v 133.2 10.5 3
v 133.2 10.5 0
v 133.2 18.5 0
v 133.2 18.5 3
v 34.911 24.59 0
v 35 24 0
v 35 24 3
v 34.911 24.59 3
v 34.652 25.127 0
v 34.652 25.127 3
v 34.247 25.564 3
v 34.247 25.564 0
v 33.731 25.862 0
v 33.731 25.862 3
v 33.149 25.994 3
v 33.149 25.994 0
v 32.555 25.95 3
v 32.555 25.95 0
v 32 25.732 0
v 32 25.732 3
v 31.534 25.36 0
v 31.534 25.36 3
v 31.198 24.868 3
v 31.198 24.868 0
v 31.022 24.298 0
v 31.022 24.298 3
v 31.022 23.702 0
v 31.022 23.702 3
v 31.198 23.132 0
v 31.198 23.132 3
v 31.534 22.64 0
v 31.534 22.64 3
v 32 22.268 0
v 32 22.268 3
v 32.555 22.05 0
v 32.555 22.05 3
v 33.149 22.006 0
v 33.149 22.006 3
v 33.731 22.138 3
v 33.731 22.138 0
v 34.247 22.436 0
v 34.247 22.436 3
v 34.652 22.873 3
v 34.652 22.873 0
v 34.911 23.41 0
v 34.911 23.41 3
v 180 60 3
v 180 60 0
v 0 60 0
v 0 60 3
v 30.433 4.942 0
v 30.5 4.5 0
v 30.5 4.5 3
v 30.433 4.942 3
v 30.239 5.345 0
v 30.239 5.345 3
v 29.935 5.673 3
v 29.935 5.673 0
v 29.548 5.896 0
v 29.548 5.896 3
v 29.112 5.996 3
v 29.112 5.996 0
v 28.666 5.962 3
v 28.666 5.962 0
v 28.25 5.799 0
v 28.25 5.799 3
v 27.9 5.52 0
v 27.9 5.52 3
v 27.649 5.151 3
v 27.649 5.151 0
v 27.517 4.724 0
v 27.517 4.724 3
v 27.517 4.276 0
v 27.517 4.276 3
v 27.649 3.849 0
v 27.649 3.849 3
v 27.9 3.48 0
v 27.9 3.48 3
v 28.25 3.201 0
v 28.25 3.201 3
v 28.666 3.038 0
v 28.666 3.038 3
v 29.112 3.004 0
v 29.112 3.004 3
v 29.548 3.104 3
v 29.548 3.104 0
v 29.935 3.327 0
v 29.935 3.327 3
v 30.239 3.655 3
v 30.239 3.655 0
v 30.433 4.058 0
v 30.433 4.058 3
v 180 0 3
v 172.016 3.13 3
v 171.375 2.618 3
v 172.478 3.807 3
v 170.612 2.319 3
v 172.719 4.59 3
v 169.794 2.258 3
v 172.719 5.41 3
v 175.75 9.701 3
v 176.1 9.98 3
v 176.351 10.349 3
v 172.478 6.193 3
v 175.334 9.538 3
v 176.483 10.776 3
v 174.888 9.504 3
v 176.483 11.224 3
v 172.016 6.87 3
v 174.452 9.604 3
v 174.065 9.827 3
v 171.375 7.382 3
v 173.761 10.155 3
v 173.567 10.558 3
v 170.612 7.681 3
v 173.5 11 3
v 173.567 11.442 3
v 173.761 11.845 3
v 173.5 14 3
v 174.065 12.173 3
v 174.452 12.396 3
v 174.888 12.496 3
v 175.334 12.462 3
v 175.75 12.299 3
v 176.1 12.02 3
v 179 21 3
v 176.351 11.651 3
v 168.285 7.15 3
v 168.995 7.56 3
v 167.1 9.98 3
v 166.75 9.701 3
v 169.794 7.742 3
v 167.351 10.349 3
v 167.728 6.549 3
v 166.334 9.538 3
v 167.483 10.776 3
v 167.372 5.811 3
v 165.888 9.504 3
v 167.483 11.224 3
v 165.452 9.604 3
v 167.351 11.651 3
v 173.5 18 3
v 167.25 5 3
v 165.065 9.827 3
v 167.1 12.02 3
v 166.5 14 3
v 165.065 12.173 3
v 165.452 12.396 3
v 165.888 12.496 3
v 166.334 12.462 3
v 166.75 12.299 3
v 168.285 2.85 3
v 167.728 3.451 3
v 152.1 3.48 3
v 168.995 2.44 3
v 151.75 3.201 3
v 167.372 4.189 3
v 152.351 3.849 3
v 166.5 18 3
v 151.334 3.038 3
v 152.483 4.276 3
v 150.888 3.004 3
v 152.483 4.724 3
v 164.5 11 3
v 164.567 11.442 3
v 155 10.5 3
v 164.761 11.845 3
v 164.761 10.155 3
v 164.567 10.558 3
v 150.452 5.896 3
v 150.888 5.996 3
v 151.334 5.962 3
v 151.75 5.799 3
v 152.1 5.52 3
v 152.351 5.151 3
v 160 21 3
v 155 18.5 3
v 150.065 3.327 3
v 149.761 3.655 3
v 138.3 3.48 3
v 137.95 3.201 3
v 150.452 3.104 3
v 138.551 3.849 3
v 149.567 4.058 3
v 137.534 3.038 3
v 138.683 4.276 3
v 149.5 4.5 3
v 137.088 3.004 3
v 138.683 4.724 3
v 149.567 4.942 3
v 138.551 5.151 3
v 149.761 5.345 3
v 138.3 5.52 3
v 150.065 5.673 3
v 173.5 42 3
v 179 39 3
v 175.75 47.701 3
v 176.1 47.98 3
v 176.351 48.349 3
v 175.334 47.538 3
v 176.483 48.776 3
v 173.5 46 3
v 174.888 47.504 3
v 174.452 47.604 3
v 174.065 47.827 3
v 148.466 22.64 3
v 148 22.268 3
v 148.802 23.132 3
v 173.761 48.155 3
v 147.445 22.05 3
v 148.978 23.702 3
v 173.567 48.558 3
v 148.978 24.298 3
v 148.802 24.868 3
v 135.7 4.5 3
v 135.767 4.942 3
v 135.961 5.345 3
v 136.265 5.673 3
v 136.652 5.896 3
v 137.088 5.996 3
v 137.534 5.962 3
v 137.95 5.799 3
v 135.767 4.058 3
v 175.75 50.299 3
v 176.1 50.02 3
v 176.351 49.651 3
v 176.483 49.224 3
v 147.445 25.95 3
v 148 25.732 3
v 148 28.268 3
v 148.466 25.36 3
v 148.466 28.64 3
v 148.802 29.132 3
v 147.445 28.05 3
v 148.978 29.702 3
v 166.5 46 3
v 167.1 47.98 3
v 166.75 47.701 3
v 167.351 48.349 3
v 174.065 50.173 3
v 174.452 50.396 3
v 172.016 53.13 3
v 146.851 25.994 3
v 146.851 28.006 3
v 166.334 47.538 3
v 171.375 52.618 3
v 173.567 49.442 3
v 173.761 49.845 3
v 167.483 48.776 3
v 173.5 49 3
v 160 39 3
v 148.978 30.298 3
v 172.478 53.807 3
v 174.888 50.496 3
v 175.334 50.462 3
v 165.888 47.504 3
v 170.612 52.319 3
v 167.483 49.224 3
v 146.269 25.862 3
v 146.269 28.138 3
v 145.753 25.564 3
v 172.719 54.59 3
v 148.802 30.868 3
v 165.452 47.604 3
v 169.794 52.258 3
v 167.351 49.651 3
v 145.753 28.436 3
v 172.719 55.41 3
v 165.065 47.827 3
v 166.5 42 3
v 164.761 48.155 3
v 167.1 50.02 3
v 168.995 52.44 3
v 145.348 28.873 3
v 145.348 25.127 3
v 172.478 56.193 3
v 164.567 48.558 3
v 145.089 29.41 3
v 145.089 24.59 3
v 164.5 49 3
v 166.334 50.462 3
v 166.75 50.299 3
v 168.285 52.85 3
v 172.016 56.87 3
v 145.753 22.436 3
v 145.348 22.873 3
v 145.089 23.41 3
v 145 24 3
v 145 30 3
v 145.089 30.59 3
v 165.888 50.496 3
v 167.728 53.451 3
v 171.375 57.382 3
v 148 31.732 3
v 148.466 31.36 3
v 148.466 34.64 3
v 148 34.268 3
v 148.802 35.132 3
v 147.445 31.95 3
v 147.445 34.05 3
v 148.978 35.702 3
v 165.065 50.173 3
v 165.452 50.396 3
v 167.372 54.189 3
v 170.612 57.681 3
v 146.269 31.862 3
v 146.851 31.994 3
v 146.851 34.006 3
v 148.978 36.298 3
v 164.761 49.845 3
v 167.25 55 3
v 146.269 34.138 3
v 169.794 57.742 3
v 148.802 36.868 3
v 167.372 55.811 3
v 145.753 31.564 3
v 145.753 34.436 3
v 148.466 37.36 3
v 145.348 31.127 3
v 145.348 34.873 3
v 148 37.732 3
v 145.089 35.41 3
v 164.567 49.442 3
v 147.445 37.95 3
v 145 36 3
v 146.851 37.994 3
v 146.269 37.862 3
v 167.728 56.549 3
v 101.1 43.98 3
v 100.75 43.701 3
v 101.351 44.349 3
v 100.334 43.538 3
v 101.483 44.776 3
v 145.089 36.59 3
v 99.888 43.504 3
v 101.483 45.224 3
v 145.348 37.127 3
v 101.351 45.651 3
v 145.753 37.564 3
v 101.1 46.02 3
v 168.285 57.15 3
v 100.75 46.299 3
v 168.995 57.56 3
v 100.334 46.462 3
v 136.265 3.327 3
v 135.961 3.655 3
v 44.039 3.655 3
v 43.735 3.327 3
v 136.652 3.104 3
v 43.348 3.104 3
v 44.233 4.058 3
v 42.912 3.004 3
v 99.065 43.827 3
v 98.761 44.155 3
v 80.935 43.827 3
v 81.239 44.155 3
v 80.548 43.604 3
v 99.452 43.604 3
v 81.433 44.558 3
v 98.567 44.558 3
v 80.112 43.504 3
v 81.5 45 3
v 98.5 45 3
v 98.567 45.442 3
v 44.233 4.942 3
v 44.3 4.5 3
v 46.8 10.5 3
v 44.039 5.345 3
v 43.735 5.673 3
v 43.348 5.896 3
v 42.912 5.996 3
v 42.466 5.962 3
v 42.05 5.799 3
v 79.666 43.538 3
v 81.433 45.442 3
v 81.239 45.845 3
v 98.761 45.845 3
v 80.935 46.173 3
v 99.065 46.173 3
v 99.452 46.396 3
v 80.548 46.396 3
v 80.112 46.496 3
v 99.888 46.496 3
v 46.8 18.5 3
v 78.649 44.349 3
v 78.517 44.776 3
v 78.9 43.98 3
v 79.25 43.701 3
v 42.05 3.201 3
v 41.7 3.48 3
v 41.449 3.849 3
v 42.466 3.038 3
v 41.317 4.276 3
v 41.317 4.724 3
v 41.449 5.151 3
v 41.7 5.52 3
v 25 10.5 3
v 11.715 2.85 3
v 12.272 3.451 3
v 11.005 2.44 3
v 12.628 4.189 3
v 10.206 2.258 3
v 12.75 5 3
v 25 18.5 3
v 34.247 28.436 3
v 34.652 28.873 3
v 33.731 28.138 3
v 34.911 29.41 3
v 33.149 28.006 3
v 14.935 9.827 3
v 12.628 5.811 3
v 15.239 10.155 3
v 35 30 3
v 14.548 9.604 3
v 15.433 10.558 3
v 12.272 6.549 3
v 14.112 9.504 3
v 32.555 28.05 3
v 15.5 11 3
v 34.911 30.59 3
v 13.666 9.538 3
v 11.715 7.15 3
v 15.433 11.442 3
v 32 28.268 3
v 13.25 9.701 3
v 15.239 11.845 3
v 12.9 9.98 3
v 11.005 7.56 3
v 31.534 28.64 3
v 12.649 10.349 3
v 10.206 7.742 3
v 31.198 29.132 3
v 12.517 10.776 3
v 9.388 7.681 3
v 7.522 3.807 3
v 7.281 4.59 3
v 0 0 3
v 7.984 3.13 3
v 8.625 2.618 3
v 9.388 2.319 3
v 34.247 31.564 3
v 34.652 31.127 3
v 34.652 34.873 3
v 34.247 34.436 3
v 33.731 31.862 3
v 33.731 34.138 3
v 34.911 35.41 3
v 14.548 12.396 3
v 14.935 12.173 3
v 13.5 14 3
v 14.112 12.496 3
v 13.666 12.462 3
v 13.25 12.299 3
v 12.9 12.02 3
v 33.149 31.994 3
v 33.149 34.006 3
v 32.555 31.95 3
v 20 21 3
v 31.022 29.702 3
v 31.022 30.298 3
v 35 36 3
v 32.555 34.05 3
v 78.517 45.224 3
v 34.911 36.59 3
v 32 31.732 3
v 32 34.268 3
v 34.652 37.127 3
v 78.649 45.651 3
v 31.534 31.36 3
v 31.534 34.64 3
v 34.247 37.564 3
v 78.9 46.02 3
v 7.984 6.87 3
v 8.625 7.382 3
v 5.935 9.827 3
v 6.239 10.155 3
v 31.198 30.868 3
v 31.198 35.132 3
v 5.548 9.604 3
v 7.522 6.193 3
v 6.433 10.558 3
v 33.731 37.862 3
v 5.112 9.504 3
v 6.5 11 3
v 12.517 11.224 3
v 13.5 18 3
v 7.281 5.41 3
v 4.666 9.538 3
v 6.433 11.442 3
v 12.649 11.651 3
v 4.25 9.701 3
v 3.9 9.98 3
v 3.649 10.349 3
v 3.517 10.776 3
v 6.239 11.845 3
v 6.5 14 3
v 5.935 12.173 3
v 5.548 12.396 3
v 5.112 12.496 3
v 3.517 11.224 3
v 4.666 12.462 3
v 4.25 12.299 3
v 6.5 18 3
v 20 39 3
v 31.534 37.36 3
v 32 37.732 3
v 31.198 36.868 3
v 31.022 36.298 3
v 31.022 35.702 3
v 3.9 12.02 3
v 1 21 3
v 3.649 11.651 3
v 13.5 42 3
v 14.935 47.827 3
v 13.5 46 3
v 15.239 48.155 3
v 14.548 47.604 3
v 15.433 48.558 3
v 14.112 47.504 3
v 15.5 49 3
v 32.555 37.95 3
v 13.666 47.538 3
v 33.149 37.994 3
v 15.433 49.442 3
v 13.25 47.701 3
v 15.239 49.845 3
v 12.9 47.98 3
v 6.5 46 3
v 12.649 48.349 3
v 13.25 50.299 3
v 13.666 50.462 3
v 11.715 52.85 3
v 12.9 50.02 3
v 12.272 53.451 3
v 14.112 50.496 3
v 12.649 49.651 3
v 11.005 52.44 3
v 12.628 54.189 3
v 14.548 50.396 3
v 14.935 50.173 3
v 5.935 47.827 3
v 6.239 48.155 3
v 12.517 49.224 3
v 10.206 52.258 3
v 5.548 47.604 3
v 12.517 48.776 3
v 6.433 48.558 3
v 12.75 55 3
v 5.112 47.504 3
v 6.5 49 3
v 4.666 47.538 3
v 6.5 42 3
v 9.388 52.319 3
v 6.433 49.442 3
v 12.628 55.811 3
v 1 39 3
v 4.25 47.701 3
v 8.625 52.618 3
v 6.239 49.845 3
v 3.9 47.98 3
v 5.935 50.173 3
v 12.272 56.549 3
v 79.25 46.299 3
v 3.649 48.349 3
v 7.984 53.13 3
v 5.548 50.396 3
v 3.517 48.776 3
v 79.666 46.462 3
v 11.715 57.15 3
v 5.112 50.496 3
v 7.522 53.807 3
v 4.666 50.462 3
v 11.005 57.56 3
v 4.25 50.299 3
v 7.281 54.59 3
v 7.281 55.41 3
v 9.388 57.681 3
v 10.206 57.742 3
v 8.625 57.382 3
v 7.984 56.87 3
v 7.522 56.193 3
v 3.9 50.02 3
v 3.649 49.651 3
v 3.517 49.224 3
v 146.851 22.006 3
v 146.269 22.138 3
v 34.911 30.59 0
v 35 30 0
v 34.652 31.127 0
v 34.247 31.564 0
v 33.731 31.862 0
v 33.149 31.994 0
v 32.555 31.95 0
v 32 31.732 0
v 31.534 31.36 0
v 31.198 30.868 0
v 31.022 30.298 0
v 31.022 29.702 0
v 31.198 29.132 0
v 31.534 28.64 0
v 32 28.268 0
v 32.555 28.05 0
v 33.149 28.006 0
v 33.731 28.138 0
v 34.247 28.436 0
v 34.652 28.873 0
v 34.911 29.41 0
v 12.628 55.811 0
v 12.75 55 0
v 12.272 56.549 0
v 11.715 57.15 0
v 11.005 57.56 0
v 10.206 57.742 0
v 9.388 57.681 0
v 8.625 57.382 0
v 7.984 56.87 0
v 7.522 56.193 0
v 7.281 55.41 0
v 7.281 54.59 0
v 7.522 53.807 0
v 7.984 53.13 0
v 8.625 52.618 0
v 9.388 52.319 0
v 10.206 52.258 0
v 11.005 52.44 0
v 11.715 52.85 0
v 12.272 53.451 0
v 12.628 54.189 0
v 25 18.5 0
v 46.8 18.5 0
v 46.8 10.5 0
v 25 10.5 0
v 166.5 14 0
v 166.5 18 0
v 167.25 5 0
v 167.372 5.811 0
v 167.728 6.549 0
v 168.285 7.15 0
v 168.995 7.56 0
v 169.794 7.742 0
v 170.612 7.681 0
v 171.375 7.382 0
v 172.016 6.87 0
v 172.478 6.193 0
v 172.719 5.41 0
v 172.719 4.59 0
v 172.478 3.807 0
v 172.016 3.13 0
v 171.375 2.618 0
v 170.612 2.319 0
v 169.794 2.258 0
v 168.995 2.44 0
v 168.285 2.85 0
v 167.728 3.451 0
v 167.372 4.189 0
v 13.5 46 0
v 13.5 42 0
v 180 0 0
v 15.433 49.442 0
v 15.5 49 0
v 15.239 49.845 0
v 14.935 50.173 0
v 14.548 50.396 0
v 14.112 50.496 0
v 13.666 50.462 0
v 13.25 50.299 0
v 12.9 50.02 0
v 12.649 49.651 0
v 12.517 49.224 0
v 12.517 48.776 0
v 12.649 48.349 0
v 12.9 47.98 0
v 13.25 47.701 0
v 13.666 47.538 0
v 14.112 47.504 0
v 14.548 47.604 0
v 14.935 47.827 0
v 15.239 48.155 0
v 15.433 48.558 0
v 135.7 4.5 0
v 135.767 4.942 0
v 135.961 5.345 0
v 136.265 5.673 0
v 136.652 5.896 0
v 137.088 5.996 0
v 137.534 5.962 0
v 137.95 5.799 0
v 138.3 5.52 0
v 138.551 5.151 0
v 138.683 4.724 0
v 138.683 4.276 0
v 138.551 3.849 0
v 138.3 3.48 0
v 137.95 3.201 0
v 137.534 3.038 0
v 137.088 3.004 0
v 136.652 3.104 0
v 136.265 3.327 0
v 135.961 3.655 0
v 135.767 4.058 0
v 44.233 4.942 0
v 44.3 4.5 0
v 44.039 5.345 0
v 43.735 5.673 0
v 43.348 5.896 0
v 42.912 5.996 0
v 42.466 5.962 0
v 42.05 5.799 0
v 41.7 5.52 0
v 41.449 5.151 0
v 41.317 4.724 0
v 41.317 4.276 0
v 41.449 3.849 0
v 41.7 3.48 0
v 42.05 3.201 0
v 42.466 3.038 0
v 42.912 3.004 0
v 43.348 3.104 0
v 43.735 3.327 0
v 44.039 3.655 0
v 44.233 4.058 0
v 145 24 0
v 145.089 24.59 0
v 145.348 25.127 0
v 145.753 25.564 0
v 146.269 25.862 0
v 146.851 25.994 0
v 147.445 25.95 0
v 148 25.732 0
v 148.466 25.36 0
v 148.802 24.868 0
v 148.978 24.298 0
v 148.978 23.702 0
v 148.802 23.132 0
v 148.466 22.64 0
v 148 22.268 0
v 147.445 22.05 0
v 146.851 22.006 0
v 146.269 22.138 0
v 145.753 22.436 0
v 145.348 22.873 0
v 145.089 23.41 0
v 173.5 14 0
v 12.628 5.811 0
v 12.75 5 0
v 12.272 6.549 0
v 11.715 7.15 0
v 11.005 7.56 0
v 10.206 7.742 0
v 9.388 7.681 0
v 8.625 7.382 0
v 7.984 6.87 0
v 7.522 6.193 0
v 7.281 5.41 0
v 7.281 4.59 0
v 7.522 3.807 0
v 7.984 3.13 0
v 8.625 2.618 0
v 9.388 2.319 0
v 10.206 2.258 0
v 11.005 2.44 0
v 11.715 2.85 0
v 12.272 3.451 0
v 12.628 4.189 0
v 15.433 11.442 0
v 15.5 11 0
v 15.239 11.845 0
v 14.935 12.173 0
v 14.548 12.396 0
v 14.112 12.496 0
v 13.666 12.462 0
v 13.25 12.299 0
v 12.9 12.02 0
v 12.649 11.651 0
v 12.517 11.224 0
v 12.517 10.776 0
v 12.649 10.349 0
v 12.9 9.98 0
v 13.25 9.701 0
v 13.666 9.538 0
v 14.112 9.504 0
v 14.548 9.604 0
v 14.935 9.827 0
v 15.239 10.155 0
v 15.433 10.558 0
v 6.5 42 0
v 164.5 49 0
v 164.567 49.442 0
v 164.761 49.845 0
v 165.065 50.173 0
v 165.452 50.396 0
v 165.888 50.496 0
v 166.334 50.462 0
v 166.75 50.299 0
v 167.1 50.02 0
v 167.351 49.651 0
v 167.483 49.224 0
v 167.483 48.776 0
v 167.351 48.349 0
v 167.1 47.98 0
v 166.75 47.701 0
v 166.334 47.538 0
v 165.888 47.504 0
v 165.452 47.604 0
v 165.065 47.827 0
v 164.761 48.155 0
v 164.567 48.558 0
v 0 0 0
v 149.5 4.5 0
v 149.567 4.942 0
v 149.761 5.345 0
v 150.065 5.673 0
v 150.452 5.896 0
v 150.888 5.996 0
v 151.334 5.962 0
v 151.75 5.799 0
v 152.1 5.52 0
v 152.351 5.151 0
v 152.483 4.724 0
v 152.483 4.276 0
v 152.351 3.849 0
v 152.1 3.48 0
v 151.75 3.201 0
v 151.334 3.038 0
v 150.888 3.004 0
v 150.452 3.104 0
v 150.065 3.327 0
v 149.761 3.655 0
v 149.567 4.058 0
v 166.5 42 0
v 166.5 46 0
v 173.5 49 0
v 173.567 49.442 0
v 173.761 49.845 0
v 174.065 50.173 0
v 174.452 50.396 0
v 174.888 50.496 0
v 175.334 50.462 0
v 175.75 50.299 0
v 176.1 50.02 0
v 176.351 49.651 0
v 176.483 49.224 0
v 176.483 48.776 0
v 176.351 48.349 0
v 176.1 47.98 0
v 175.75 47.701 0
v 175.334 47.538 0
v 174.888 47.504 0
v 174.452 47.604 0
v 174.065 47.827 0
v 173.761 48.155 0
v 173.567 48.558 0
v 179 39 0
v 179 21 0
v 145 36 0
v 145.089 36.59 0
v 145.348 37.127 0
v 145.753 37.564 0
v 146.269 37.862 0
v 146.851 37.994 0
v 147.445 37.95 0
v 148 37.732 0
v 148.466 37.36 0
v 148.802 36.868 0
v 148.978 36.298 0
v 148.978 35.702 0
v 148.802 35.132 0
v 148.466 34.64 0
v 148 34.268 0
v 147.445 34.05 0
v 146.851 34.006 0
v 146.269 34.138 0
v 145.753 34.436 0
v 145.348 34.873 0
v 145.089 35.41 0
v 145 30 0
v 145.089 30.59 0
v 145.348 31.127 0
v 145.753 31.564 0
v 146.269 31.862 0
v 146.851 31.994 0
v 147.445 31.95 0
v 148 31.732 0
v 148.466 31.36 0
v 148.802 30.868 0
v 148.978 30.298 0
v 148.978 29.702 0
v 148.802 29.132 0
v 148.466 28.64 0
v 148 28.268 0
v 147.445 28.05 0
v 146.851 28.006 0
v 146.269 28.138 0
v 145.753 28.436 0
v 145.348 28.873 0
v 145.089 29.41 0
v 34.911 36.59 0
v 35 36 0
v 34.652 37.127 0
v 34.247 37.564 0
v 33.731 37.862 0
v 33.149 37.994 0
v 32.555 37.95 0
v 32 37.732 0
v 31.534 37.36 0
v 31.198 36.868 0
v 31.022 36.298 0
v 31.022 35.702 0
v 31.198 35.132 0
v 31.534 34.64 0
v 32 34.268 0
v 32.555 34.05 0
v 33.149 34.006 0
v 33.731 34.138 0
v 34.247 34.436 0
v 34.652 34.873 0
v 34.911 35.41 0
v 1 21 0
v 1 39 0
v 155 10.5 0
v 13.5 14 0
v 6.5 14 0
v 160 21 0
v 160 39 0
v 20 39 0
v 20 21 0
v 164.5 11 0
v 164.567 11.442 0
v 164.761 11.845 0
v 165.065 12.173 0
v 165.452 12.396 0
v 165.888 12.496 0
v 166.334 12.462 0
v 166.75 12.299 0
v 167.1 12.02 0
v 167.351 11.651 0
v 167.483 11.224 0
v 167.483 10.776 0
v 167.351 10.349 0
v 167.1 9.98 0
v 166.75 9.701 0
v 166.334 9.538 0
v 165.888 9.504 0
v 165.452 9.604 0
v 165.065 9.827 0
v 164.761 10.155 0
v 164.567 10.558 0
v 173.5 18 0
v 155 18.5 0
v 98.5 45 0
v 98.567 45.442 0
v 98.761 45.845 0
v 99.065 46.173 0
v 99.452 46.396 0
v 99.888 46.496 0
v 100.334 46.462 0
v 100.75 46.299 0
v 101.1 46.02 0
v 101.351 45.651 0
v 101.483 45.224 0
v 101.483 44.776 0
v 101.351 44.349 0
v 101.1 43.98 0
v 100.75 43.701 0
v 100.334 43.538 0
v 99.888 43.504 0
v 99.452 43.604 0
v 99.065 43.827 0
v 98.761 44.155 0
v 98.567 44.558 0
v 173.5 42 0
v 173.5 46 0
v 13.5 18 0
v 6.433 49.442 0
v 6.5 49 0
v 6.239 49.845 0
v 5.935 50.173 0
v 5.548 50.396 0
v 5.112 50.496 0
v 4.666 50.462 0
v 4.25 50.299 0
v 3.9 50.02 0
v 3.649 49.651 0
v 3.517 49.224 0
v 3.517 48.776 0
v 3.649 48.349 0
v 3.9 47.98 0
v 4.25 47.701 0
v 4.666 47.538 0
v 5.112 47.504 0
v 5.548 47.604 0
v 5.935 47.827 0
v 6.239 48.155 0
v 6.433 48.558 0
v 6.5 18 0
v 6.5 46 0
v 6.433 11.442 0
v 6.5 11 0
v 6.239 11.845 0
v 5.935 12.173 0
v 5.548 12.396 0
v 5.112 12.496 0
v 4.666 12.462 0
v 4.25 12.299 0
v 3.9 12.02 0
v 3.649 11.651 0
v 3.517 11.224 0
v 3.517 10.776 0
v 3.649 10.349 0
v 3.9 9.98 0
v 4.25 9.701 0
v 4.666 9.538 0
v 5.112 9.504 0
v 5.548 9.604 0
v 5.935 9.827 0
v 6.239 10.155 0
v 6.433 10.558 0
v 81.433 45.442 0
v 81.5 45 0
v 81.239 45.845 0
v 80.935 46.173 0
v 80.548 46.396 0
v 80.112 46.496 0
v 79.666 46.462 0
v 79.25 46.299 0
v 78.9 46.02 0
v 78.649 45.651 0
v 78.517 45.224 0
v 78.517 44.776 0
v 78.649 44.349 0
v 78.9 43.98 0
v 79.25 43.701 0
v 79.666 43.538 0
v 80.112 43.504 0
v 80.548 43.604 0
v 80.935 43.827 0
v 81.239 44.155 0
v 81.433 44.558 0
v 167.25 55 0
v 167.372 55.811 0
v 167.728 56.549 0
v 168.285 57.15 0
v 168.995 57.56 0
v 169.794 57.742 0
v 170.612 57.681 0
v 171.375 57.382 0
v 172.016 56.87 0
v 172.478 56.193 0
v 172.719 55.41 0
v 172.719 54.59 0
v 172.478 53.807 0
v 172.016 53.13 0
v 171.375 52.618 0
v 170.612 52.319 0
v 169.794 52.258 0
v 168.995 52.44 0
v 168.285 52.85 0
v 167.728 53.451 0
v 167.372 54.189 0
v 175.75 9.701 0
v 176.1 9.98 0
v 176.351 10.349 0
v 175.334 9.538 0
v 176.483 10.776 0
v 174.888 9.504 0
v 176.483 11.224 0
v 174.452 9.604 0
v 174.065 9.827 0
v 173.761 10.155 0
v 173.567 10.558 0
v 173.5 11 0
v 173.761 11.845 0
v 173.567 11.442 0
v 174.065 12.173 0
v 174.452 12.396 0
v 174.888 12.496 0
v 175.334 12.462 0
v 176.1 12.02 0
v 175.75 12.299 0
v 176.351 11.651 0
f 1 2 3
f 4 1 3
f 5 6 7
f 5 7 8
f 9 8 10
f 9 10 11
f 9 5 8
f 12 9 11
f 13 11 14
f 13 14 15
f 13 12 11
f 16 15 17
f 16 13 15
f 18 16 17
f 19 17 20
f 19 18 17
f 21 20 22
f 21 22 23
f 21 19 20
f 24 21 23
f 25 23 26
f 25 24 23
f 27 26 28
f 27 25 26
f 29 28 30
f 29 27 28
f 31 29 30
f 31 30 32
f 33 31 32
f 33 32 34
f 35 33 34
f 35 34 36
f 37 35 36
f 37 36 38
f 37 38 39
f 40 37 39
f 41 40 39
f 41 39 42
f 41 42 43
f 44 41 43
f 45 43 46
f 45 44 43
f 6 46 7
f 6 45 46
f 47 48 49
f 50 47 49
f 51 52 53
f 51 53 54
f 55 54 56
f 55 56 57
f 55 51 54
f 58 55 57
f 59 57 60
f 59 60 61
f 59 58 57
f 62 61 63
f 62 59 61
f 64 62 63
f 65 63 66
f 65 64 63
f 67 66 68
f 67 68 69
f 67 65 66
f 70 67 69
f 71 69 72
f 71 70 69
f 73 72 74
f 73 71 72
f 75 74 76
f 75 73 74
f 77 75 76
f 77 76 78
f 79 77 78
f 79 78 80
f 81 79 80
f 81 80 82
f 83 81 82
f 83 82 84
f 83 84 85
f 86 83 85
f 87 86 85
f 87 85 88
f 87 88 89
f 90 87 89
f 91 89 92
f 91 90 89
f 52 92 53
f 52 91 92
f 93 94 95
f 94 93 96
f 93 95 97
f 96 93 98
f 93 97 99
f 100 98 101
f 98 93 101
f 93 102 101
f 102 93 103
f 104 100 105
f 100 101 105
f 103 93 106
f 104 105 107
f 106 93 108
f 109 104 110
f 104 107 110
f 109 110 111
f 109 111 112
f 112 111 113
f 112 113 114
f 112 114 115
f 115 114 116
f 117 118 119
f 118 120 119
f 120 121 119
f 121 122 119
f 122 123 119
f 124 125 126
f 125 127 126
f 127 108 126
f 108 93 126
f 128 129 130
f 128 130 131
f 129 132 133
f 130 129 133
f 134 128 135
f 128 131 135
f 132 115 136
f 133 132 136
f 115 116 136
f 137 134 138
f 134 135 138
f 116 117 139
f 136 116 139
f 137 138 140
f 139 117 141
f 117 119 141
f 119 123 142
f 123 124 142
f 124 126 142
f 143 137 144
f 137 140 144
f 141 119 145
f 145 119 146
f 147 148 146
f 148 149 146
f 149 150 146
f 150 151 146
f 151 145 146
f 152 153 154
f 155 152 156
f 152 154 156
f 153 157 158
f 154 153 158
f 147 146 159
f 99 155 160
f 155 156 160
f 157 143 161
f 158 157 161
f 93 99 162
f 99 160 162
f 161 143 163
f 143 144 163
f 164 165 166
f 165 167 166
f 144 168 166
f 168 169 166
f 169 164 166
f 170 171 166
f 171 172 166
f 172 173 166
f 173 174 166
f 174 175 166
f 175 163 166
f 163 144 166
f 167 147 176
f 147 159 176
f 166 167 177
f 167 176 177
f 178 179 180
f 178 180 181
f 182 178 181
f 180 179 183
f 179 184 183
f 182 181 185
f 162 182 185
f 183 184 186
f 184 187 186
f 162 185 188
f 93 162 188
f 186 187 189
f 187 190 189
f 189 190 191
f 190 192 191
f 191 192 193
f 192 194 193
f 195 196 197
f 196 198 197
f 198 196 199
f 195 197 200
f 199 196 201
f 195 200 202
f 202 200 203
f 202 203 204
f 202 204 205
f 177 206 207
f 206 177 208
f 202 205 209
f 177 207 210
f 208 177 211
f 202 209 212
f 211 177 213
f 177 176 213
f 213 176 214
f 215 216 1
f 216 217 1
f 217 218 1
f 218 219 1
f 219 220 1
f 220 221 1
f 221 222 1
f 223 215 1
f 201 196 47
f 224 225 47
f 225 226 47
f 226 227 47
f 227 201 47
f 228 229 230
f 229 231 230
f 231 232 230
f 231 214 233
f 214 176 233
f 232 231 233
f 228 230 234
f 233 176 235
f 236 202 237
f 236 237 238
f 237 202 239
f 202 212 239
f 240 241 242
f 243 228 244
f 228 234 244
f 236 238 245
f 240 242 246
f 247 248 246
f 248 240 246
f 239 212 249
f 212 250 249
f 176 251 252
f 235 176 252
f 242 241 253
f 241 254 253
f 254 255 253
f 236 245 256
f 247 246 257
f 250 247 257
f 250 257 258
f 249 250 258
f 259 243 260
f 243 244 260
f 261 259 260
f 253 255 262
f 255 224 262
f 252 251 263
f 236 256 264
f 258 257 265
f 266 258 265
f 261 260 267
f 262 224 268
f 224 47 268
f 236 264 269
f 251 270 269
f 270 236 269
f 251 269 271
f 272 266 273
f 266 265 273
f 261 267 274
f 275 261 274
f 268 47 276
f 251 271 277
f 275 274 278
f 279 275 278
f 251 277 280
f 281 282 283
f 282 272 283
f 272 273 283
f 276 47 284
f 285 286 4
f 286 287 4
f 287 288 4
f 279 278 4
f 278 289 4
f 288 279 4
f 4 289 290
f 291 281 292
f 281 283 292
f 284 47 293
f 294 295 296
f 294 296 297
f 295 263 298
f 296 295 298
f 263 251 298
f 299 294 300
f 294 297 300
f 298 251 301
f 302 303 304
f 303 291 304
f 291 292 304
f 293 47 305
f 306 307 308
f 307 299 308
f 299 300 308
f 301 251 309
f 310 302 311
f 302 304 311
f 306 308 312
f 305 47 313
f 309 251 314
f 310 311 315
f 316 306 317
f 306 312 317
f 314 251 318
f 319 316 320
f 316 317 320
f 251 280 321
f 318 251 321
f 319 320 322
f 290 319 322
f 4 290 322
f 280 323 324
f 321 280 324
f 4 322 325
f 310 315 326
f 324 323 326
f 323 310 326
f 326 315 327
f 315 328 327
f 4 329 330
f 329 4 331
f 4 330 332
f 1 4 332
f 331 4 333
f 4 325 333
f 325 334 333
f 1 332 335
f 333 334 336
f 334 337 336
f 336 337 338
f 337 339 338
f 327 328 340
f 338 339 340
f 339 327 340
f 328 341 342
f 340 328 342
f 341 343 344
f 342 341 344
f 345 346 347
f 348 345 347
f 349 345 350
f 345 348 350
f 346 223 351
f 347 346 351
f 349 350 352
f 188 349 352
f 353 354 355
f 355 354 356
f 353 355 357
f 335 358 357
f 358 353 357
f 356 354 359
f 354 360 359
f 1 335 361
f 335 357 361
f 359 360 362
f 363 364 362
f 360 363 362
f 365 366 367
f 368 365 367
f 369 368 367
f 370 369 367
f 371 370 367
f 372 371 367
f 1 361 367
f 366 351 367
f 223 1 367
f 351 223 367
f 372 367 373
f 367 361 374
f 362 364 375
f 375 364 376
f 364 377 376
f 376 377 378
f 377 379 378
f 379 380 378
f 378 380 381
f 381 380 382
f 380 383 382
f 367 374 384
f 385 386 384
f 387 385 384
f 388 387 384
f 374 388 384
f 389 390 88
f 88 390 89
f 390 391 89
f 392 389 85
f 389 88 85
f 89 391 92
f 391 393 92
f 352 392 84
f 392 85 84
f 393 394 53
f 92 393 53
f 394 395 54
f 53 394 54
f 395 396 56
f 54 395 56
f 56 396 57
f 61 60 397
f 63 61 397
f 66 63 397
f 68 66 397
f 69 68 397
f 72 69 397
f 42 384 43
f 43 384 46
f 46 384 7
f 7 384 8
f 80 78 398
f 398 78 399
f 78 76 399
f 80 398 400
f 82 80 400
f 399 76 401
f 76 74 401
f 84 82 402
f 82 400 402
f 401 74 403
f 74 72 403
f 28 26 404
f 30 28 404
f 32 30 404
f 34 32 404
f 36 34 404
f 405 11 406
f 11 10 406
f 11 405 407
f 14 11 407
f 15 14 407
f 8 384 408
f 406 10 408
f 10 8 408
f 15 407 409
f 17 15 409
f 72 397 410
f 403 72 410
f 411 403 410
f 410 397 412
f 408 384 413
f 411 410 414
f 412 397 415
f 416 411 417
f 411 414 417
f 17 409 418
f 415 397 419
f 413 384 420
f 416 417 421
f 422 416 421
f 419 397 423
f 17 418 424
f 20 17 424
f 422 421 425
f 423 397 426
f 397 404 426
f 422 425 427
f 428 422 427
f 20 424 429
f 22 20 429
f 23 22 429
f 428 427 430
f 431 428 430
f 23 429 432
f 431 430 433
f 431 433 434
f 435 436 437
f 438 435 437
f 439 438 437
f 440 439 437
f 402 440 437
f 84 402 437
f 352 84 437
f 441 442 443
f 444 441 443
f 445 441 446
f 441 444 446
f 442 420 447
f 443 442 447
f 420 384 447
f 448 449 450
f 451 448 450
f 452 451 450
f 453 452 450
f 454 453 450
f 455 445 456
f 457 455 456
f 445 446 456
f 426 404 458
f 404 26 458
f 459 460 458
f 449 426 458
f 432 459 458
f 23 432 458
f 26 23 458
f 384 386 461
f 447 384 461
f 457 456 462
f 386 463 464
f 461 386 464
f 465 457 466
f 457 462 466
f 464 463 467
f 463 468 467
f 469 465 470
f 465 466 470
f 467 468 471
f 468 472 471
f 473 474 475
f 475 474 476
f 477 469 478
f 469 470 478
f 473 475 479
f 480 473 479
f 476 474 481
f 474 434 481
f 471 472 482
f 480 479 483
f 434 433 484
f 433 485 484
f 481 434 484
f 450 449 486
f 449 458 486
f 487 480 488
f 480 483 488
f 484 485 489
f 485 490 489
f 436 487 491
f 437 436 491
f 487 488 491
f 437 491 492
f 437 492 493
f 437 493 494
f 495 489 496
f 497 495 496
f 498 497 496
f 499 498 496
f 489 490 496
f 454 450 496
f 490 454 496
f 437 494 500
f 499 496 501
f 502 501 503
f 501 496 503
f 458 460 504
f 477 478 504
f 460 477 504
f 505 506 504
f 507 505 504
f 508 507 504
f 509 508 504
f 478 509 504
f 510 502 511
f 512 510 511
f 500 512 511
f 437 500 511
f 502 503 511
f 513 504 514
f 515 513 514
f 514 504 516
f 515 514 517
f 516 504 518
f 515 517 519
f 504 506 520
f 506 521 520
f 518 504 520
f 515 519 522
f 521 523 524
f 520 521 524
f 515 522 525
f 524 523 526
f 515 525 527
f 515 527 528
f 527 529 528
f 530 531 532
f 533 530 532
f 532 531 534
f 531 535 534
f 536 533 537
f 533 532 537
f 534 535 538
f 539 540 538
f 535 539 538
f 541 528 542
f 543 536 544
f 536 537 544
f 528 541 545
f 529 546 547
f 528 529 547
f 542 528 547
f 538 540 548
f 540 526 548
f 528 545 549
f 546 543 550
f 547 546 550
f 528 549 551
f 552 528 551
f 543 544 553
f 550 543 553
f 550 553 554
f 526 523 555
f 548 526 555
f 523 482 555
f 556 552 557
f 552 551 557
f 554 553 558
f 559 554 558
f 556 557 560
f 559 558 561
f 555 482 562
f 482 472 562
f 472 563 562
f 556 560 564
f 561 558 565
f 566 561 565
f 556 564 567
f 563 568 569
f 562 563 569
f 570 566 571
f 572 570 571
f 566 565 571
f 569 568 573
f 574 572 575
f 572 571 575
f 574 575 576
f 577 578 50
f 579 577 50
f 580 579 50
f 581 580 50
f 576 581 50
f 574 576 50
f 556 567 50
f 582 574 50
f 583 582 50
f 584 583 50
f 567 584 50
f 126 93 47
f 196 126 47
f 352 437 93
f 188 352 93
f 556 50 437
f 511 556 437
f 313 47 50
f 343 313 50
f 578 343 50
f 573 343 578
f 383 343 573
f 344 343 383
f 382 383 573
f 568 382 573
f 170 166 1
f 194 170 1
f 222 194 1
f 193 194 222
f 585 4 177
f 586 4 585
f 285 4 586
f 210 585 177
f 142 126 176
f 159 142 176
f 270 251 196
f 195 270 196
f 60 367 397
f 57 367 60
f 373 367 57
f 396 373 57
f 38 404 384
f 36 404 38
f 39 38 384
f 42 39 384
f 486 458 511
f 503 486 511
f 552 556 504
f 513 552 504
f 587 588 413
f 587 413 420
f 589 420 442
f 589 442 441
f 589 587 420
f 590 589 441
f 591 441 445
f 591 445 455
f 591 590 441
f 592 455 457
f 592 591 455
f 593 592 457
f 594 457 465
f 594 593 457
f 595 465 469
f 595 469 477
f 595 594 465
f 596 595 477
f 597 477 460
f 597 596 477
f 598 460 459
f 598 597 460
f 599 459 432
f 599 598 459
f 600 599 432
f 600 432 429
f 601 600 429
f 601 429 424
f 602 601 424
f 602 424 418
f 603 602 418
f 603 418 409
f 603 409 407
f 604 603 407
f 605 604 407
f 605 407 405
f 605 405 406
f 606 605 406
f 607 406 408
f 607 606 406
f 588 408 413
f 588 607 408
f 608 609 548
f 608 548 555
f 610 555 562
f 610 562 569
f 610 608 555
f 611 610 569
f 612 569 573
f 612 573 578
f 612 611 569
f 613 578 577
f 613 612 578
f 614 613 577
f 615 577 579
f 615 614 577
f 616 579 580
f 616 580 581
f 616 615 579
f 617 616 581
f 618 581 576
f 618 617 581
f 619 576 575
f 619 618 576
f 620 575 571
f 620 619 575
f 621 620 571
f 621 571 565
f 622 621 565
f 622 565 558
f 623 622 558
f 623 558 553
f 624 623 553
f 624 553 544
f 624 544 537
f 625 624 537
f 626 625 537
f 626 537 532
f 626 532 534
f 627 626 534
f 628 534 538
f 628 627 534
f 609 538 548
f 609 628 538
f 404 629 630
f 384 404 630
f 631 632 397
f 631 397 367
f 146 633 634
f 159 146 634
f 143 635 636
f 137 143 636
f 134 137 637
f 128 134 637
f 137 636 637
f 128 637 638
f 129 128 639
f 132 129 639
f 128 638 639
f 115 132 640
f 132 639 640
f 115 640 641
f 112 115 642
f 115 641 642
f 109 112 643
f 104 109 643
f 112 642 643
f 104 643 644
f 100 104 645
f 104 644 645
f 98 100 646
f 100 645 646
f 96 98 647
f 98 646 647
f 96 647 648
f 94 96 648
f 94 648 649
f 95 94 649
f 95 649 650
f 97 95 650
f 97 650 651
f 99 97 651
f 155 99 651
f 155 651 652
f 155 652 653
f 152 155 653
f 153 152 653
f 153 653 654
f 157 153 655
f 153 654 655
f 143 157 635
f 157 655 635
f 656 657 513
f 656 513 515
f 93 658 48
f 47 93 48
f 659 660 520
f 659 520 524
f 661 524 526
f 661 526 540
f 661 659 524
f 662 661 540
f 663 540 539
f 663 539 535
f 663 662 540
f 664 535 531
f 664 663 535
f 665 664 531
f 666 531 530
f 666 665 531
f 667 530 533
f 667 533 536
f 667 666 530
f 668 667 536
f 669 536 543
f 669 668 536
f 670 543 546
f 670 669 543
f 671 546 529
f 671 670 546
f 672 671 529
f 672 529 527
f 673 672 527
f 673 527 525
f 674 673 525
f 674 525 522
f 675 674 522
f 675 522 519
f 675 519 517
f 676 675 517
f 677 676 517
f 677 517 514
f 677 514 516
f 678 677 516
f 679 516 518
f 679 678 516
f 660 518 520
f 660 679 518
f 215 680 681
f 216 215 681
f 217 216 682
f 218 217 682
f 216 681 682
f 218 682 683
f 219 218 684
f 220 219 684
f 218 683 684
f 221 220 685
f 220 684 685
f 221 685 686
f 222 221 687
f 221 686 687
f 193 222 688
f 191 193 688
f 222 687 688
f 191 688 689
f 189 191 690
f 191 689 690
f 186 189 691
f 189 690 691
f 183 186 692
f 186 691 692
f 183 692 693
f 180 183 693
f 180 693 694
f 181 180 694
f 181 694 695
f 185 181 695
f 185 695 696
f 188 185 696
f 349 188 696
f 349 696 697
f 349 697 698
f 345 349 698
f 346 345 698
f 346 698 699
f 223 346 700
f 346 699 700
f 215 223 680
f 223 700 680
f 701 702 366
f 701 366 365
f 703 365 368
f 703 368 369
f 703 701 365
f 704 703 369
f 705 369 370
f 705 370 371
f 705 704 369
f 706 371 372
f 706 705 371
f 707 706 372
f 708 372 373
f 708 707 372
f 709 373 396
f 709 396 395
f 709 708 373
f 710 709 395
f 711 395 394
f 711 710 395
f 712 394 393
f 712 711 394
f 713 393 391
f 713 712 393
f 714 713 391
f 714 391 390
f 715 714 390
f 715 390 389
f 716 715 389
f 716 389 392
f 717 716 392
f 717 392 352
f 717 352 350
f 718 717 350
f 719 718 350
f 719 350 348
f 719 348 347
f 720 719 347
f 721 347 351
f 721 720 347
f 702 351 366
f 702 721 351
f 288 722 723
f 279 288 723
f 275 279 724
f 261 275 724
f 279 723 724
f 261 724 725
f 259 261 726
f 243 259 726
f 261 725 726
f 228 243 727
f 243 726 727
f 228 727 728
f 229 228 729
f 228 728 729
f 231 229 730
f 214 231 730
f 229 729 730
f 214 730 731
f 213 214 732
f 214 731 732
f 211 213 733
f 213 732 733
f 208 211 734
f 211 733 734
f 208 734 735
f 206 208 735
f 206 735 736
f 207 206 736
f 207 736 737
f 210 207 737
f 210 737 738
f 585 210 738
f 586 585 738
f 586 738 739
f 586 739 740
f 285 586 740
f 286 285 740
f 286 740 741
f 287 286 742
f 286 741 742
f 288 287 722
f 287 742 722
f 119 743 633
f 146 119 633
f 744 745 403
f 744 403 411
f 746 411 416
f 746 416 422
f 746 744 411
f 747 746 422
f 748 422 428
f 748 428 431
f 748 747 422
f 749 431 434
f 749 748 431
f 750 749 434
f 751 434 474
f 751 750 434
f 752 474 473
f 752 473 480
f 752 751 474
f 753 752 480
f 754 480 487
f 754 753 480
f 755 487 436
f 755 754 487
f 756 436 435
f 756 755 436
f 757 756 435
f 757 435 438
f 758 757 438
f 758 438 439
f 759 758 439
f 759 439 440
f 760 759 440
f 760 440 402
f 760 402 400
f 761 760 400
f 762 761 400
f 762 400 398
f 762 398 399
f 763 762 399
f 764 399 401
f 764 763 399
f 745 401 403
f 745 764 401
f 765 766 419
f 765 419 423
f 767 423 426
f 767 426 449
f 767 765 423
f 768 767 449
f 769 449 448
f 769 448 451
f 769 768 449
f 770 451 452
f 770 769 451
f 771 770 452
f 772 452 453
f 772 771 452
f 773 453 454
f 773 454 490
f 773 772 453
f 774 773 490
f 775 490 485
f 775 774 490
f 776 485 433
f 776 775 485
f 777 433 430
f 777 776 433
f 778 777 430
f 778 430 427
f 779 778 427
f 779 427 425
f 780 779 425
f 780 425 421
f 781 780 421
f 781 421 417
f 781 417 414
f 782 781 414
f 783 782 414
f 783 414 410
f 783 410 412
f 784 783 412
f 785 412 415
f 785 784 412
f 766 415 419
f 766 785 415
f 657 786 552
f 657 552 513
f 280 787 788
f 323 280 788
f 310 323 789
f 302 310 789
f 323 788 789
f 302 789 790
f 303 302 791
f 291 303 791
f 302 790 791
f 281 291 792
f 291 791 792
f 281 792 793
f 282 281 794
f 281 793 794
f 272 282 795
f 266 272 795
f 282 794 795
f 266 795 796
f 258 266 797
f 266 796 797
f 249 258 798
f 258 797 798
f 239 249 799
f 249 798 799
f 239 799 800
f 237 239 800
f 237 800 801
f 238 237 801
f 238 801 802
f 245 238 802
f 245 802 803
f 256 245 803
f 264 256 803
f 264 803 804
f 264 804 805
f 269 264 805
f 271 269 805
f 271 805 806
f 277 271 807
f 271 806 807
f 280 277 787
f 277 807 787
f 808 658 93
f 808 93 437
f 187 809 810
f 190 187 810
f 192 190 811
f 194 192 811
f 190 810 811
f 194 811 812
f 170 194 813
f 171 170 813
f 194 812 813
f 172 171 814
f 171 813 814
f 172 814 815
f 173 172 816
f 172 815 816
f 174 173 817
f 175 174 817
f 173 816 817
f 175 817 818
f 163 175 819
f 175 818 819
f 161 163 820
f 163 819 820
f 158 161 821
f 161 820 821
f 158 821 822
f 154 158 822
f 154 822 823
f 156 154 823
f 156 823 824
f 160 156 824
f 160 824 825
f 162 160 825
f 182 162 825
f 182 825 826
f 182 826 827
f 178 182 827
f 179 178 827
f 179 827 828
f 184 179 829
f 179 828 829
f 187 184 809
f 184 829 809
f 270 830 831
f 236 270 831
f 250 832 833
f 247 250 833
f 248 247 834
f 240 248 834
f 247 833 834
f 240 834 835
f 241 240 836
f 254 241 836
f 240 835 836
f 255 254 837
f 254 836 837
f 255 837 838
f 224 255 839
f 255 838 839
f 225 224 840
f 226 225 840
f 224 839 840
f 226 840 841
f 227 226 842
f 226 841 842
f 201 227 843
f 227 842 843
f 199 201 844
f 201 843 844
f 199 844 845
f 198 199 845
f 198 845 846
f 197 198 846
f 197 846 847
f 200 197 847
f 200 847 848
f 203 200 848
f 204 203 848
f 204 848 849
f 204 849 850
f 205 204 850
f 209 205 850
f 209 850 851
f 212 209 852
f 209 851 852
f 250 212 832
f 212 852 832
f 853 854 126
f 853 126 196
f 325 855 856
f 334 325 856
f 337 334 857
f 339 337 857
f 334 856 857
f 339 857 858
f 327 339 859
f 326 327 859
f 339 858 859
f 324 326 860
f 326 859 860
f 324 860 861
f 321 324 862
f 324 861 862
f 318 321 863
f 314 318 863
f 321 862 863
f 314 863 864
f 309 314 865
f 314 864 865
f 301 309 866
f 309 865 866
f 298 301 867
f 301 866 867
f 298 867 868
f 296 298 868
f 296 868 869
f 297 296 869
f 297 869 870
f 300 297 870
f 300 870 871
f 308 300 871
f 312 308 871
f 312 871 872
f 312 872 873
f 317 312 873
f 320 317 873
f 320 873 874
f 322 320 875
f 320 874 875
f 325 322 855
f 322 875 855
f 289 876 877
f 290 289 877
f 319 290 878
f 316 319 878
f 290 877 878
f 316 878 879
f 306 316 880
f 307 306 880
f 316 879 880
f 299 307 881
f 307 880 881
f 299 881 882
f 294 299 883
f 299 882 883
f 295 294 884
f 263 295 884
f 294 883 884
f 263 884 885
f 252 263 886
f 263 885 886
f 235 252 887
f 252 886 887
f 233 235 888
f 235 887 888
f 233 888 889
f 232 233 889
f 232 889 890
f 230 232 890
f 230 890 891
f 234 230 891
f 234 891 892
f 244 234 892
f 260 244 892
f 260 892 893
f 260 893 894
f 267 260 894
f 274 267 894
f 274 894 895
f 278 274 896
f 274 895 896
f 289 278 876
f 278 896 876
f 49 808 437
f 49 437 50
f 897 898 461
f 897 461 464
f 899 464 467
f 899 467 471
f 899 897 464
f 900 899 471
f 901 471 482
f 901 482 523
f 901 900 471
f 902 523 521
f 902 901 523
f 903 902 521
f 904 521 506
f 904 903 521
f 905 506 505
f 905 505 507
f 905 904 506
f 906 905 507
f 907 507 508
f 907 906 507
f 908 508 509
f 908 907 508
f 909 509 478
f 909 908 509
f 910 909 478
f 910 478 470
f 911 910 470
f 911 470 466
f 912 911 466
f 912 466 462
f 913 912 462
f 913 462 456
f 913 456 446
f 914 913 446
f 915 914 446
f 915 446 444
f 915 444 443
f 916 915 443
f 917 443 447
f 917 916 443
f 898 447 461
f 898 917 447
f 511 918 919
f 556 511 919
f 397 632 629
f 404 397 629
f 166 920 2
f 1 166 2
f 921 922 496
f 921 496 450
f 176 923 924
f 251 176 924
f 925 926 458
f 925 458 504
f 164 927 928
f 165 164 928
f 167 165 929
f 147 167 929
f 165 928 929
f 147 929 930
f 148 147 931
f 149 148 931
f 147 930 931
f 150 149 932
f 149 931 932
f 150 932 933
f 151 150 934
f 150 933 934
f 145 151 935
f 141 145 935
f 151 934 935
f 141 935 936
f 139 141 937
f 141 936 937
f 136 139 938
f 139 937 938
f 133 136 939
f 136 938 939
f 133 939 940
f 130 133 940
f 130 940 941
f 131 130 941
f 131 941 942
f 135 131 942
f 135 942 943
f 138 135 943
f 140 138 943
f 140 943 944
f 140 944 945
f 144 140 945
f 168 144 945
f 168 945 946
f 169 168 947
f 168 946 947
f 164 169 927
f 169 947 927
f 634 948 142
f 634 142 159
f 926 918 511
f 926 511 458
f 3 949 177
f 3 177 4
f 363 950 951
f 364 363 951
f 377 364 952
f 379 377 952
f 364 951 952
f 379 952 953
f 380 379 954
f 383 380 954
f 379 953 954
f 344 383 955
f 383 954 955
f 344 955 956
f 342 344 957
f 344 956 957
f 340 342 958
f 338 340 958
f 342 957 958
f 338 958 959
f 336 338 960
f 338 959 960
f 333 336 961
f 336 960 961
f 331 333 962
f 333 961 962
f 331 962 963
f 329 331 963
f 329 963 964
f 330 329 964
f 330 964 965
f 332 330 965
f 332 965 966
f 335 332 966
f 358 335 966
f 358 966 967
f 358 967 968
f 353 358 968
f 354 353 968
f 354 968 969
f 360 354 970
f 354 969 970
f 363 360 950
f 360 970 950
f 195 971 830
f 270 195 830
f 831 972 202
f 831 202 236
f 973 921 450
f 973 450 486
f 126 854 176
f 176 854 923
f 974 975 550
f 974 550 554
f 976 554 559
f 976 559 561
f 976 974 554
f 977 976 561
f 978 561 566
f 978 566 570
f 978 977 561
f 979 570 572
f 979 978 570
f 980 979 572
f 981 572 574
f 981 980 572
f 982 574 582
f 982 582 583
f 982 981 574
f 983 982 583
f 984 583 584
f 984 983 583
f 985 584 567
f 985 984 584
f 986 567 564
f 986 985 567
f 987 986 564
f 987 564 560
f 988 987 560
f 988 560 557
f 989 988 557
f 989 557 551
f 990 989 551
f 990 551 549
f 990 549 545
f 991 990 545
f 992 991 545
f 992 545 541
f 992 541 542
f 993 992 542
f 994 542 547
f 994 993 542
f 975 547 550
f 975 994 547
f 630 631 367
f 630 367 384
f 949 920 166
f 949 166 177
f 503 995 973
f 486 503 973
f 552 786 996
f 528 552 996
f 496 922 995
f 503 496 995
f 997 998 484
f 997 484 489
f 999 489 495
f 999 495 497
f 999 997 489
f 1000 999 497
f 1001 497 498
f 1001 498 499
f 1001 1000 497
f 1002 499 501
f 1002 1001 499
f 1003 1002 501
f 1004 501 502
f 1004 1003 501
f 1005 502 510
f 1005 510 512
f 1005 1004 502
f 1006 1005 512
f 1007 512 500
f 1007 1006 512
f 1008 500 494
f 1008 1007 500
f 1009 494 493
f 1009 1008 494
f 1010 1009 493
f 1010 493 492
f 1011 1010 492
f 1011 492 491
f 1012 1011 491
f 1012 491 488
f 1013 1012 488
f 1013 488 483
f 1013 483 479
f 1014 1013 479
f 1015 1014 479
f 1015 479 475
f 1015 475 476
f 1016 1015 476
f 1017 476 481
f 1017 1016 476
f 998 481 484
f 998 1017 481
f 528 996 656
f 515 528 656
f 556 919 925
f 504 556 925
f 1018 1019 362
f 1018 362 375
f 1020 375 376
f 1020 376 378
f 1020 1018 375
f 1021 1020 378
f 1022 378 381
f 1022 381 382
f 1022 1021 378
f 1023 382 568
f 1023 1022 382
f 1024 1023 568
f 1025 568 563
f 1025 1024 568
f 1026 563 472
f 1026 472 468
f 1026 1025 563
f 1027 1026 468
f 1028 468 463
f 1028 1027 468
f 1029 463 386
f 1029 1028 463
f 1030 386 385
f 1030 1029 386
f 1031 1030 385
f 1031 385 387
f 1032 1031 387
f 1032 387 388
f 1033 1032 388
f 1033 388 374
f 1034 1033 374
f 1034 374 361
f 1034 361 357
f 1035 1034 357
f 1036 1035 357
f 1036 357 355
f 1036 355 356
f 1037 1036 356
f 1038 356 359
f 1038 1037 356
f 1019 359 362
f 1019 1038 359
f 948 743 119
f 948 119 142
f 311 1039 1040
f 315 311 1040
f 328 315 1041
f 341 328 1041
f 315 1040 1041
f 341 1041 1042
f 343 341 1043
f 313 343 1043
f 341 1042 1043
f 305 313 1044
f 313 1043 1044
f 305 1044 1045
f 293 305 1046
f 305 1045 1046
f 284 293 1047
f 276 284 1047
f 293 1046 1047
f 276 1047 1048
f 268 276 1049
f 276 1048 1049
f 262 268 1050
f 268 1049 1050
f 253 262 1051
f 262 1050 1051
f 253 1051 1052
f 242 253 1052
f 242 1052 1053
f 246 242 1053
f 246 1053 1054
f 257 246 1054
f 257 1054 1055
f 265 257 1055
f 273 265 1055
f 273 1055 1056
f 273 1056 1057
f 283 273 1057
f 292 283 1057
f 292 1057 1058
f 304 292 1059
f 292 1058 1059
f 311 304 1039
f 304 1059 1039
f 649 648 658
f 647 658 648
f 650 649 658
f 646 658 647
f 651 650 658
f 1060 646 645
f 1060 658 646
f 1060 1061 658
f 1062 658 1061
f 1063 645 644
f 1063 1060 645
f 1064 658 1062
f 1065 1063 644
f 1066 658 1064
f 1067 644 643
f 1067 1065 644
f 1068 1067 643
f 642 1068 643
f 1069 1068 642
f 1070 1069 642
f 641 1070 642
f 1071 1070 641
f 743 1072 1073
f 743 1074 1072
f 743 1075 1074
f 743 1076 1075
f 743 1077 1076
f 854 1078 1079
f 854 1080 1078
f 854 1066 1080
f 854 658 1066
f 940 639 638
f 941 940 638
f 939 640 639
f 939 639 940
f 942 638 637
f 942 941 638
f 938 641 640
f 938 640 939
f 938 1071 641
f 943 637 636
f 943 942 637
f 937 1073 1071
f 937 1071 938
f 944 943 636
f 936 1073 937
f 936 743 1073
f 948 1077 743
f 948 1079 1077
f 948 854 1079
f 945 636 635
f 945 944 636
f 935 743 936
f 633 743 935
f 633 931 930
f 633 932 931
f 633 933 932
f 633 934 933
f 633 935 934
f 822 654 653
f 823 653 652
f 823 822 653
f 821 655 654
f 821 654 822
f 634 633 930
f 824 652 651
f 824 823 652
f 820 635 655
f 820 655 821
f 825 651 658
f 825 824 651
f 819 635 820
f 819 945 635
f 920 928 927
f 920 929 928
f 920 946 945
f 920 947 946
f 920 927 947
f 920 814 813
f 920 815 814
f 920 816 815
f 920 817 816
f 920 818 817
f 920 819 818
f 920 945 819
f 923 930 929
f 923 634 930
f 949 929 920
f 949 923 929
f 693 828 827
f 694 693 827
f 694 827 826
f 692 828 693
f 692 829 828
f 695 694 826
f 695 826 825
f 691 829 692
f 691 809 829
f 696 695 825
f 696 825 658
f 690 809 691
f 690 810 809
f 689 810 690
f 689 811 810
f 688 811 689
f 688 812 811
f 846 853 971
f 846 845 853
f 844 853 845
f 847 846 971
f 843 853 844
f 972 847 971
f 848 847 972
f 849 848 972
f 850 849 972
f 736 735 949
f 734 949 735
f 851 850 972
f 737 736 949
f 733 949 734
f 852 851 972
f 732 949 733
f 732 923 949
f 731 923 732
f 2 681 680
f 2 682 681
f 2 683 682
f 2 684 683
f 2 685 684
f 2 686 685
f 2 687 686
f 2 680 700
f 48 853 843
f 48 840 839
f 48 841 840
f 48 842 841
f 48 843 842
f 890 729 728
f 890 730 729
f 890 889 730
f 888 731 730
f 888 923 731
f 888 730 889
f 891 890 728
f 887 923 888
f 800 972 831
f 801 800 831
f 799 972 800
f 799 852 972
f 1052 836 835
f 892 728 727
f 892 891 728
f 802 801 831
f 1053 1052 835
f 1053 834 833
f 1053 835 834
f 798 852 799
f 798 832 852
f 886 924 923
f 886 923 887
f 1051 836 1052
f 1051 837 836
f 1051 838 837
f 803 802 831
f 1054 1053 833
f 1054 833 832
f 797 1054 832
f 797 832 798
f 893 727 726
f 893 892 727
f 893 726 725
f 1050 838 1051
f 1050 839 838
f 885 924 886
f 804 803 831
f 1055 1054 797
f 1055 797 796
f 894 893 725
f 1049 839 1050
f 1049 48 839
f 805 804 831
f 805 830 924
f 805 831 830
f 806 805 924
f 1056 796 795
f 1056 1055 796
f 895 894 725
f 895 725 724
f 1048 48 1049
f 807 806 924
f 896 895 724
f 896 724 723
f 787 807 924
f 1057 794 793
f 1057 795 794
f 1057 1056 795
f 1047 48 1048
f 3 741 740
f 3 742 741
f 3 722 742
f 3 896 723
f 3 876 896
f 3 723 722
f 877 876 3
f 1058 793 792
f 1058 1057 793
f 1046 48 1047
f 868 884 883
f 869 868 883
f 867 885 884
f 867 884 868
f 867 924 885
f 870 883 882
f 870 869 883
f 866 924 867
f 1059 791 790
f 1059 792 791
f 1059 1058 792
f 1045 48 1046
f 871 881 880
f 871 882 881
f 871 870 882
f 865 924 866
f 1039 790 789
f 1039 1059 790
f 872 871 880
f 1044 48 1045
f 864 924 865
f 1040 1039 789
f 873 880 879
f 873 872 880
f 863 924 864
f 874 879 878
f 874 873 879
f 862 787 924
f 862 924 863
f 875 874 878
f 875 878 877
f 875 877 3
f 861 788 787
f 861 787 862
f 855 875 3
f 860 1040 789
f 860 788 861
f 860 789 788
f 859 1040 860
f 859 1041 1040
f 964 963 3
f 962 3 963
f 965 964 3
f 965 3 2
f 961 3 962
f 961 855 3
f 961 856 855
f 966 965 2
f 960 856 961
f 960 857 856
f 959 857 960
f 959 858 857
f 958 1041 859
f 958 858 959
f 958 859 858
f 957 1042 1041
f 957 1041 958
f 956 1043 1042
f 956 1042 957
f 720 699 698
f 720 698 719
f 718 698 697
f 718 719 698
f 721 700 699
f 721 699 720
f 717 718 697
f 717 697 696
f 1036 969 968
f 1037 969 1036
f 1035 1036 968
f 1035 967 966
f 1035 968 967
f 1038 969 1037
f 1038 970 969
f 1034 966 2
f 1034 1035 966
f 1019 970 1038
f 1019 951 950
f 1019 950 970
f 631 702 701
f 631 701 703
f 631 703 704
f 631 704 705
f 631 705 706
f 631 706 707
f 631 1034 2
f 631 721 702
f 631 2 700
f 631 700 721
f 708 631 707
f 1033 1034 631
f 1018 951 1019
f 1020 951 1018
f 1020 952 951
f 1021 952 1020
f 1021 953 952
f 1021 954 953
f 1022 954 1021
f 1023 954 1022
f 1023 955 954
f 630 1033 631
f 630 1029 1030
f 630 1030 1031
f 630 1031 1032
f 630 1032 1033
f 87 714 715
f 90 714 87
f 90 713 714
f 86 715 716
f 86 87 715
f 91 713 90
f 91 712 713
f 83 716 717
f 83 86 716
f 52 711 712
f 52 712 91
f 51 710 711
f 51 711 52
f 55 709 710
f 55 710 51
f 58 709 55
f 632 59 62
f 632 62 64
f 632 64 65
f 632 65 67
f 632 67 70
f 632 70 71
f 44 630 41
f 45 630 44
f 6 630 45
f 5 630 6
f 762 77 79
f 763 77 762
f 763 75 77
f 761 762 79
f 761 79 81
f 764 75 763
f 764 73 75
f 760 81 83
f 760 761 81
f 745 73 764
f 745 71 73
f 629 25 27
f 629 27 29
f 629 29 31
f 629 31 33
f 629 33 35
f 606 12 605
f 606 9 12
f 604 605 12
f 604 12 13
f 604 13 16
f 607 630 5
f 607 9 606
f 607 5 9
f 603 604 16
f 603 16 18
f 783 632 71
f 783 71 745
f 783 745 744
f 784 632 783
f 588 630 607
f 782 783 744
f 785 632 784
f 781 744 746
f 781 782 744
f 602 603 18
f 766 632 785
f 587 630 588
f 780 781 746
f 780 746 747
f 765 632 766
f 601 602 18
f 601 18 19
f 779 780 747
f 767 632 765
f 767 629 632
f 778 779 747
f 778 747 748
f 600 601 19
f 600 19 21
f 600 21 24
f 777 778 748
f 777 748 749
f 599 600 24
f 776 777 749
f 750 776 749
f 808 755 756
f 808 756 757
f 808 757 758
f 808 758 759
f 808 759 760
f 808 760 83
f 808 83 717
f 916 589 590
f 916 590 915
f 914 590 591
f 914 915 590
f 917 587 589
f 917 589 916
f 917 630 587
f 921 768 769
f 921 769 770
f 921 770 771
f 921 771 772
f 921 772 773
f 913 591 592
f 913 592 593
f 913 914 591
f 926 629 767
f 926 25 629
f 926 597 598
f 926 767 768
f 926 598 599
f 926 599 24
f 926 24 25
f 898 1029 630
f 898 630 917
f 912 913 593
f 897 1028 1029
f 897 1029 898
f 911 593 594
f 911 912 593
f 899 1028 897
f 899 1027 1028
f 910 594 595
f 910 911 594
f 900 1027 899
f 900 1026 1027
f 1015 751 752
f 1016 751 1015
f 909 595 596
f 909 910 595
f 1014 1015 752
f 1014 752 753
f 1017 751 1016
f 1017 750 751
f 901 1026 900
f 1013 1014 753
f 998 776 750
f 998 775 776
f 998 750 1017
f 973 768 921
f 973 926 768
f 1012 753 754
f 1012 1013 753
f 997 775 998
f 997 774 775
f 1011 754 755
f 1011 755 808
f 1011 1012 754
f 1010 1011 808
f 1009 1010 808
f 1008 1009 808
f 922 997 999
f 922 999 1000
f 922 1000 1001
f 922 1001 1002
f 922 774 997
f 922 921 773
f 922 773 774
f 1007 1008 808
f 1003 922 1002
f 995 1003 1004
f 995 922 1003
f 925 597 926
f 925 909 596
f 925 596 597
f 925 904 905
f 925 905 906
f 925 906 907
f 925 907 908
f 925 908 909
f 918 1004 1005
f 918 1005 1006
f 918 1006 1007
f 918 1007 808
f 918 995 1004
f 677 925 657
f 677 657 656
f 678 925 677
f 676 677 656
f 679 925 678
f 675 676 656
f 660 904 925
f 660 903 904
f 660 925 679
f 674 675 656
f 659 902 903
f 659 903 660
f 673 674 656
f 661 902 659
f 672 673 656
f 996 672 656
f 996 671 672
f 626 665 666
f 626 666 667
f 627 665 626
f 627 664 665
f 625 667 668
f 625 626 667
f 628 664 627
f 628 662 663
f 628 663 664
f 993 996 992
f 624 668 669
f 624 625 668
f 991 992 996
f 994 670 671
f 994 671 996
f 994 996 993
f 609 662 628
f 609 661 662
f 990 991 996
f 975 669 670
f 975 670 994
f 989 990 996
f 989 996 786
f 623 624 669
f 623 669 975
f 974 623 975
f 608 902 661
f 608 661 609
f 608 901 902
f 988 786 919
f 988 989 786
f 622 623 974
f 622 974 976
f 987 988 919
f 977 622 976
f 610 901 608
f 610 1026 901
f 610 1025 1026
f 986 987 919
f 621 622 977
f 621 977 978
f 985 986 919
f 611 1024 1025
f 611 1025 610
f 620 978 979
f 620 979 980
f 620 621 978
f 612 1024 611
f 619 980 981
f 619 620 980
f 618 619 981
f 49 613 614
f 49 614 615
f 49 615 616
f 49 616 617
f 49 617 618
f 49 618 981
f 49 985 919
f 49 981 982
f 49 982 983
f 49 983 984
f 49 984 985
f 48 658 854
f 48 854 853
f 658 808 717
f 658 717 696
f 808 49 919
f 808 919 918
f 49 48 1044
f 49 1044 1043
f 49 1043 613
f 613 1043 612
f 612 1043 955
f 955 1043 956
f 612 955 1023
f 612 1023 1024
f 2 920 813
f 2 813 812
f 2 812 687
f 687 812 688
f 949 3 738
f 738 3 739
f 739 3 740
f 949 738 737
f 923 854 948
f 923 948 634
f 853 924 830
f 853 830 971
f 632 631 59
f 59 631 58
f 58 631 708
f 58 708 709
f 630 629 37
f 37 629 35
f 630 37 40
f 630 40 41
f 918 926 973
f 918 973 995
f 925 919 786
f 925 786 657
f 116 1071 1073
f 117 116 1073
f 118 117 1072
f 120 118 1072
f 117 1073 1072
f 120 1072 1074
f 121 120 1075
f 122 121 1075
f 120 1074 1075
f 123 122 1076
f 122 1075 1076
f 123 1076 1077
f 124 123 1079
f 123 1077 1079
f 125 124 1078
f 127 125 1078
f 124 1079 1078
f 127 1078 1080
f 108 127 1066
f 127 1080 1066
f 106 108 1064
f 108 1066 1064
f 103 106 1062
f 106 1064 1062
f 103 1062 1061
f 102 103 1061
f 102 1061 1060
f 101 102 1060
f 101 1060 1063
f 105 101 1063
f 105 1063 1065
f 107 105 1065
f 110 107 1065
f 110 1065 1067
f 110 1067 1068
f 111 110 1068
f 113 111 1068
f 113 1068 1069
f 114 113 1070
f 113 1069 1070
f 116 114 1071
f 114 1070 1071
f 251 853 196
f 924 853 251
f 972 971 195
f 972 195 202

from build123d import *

# Parameters (mm, degrees)
SKETCH_W   = 90
SKETCH_H   = 60
SKETCH_R   = 2.75
SKETCH_R_2 = 2
SKETCH_R_3 = 1.5
SKETCH_W_2 = 7
SKETCH_H_2 = 4
SKETCH_W_3 = 19
SKETCH_H_3 = 18
SKETCH_W_4 = 21.8
SKETCH_H_4 = 8
PAD_DEPTH  = 3


with BuildPart() as part:
    # Sketch → Pad (new body)
    with BuildSketch(Plane.XY):
        with Locations((45, 30)):
            Rectangle(SKETCH_W, SKETCH_H)
        with Locations((10, 5)):
            Circle(SKETCH_R, mode=Mode.SUBTRACT)
        with Locations((33, 24)):
            Circle(SKETCH_R_2, mode=Mode.SUBTRACT)
        with Locations((33, 36)):
            Circle(SKETCH_R_2, mode=Mode.SUBTRACT)
        with Locations((33, 30)):
            Circle(SKETCH_R_2, mode=Mode.SUBTRACT)
        with Locations((10, 55)):
            Circle(SKETCH_R, mode=Mode.SUBTRACT)
        with Locations((14, 11)):
            Circle(SKETCH_R_3, mode=Mode.SUBTRACT)
        with Locations((5, 11)):
            Circle(SKETCH_R_3, mode=Mode.SUBTRACT)
        with Locations((14, 49)):
            Circle(SKETCH_R_3, mode=Mode.SUBTRACT)
        with Locations((5, 49)):
            Circle(SKETCH_R_3, mode=Mode.SUBTRACT)
        with Locations((80, 45)):
            Circle(SKETCH_R_3, mode=Mode.SUBTRACT)
        with Locations((29, 4.5)):
            Circle(SKETCH_R_3, mode=Mode.SUBTRACT)
        with Locations((42.8, 4.5)):
            Circle(SKETCH_R_3, mode=Mode.SUBTRACT)
        with Locations((10, 16)):
            Rectangle(SKETCH_W_2, SKETCH_H_2, mode=Mode.SUBTRACT)
        with Locations((10, 44)):
            Rectangle(SKETCH_W_2, SKETCH_H_2, mode=Mode.SUBTRACT)
        with Locations((10.5, 30)):
            Rectangle(SKETCH_W_3, SKETCH_H_3, mode=Mode.SUBTRACT)
        with Locations((35.9, 14.5)):
            Rectangle(SKETCH_W_4, SKETCH_H_4, mode=Mode.SUBTRACT)
    pad = extrude(amount=PAD_DEPTH)

    # Mirrored: Pad across face of Pad
    add(pad.mirror(Plane(origin=(90, 30, 1.5), x_dir=(0, 1, 0), z_dir=(1, 0, 0))))


solid = part.part
